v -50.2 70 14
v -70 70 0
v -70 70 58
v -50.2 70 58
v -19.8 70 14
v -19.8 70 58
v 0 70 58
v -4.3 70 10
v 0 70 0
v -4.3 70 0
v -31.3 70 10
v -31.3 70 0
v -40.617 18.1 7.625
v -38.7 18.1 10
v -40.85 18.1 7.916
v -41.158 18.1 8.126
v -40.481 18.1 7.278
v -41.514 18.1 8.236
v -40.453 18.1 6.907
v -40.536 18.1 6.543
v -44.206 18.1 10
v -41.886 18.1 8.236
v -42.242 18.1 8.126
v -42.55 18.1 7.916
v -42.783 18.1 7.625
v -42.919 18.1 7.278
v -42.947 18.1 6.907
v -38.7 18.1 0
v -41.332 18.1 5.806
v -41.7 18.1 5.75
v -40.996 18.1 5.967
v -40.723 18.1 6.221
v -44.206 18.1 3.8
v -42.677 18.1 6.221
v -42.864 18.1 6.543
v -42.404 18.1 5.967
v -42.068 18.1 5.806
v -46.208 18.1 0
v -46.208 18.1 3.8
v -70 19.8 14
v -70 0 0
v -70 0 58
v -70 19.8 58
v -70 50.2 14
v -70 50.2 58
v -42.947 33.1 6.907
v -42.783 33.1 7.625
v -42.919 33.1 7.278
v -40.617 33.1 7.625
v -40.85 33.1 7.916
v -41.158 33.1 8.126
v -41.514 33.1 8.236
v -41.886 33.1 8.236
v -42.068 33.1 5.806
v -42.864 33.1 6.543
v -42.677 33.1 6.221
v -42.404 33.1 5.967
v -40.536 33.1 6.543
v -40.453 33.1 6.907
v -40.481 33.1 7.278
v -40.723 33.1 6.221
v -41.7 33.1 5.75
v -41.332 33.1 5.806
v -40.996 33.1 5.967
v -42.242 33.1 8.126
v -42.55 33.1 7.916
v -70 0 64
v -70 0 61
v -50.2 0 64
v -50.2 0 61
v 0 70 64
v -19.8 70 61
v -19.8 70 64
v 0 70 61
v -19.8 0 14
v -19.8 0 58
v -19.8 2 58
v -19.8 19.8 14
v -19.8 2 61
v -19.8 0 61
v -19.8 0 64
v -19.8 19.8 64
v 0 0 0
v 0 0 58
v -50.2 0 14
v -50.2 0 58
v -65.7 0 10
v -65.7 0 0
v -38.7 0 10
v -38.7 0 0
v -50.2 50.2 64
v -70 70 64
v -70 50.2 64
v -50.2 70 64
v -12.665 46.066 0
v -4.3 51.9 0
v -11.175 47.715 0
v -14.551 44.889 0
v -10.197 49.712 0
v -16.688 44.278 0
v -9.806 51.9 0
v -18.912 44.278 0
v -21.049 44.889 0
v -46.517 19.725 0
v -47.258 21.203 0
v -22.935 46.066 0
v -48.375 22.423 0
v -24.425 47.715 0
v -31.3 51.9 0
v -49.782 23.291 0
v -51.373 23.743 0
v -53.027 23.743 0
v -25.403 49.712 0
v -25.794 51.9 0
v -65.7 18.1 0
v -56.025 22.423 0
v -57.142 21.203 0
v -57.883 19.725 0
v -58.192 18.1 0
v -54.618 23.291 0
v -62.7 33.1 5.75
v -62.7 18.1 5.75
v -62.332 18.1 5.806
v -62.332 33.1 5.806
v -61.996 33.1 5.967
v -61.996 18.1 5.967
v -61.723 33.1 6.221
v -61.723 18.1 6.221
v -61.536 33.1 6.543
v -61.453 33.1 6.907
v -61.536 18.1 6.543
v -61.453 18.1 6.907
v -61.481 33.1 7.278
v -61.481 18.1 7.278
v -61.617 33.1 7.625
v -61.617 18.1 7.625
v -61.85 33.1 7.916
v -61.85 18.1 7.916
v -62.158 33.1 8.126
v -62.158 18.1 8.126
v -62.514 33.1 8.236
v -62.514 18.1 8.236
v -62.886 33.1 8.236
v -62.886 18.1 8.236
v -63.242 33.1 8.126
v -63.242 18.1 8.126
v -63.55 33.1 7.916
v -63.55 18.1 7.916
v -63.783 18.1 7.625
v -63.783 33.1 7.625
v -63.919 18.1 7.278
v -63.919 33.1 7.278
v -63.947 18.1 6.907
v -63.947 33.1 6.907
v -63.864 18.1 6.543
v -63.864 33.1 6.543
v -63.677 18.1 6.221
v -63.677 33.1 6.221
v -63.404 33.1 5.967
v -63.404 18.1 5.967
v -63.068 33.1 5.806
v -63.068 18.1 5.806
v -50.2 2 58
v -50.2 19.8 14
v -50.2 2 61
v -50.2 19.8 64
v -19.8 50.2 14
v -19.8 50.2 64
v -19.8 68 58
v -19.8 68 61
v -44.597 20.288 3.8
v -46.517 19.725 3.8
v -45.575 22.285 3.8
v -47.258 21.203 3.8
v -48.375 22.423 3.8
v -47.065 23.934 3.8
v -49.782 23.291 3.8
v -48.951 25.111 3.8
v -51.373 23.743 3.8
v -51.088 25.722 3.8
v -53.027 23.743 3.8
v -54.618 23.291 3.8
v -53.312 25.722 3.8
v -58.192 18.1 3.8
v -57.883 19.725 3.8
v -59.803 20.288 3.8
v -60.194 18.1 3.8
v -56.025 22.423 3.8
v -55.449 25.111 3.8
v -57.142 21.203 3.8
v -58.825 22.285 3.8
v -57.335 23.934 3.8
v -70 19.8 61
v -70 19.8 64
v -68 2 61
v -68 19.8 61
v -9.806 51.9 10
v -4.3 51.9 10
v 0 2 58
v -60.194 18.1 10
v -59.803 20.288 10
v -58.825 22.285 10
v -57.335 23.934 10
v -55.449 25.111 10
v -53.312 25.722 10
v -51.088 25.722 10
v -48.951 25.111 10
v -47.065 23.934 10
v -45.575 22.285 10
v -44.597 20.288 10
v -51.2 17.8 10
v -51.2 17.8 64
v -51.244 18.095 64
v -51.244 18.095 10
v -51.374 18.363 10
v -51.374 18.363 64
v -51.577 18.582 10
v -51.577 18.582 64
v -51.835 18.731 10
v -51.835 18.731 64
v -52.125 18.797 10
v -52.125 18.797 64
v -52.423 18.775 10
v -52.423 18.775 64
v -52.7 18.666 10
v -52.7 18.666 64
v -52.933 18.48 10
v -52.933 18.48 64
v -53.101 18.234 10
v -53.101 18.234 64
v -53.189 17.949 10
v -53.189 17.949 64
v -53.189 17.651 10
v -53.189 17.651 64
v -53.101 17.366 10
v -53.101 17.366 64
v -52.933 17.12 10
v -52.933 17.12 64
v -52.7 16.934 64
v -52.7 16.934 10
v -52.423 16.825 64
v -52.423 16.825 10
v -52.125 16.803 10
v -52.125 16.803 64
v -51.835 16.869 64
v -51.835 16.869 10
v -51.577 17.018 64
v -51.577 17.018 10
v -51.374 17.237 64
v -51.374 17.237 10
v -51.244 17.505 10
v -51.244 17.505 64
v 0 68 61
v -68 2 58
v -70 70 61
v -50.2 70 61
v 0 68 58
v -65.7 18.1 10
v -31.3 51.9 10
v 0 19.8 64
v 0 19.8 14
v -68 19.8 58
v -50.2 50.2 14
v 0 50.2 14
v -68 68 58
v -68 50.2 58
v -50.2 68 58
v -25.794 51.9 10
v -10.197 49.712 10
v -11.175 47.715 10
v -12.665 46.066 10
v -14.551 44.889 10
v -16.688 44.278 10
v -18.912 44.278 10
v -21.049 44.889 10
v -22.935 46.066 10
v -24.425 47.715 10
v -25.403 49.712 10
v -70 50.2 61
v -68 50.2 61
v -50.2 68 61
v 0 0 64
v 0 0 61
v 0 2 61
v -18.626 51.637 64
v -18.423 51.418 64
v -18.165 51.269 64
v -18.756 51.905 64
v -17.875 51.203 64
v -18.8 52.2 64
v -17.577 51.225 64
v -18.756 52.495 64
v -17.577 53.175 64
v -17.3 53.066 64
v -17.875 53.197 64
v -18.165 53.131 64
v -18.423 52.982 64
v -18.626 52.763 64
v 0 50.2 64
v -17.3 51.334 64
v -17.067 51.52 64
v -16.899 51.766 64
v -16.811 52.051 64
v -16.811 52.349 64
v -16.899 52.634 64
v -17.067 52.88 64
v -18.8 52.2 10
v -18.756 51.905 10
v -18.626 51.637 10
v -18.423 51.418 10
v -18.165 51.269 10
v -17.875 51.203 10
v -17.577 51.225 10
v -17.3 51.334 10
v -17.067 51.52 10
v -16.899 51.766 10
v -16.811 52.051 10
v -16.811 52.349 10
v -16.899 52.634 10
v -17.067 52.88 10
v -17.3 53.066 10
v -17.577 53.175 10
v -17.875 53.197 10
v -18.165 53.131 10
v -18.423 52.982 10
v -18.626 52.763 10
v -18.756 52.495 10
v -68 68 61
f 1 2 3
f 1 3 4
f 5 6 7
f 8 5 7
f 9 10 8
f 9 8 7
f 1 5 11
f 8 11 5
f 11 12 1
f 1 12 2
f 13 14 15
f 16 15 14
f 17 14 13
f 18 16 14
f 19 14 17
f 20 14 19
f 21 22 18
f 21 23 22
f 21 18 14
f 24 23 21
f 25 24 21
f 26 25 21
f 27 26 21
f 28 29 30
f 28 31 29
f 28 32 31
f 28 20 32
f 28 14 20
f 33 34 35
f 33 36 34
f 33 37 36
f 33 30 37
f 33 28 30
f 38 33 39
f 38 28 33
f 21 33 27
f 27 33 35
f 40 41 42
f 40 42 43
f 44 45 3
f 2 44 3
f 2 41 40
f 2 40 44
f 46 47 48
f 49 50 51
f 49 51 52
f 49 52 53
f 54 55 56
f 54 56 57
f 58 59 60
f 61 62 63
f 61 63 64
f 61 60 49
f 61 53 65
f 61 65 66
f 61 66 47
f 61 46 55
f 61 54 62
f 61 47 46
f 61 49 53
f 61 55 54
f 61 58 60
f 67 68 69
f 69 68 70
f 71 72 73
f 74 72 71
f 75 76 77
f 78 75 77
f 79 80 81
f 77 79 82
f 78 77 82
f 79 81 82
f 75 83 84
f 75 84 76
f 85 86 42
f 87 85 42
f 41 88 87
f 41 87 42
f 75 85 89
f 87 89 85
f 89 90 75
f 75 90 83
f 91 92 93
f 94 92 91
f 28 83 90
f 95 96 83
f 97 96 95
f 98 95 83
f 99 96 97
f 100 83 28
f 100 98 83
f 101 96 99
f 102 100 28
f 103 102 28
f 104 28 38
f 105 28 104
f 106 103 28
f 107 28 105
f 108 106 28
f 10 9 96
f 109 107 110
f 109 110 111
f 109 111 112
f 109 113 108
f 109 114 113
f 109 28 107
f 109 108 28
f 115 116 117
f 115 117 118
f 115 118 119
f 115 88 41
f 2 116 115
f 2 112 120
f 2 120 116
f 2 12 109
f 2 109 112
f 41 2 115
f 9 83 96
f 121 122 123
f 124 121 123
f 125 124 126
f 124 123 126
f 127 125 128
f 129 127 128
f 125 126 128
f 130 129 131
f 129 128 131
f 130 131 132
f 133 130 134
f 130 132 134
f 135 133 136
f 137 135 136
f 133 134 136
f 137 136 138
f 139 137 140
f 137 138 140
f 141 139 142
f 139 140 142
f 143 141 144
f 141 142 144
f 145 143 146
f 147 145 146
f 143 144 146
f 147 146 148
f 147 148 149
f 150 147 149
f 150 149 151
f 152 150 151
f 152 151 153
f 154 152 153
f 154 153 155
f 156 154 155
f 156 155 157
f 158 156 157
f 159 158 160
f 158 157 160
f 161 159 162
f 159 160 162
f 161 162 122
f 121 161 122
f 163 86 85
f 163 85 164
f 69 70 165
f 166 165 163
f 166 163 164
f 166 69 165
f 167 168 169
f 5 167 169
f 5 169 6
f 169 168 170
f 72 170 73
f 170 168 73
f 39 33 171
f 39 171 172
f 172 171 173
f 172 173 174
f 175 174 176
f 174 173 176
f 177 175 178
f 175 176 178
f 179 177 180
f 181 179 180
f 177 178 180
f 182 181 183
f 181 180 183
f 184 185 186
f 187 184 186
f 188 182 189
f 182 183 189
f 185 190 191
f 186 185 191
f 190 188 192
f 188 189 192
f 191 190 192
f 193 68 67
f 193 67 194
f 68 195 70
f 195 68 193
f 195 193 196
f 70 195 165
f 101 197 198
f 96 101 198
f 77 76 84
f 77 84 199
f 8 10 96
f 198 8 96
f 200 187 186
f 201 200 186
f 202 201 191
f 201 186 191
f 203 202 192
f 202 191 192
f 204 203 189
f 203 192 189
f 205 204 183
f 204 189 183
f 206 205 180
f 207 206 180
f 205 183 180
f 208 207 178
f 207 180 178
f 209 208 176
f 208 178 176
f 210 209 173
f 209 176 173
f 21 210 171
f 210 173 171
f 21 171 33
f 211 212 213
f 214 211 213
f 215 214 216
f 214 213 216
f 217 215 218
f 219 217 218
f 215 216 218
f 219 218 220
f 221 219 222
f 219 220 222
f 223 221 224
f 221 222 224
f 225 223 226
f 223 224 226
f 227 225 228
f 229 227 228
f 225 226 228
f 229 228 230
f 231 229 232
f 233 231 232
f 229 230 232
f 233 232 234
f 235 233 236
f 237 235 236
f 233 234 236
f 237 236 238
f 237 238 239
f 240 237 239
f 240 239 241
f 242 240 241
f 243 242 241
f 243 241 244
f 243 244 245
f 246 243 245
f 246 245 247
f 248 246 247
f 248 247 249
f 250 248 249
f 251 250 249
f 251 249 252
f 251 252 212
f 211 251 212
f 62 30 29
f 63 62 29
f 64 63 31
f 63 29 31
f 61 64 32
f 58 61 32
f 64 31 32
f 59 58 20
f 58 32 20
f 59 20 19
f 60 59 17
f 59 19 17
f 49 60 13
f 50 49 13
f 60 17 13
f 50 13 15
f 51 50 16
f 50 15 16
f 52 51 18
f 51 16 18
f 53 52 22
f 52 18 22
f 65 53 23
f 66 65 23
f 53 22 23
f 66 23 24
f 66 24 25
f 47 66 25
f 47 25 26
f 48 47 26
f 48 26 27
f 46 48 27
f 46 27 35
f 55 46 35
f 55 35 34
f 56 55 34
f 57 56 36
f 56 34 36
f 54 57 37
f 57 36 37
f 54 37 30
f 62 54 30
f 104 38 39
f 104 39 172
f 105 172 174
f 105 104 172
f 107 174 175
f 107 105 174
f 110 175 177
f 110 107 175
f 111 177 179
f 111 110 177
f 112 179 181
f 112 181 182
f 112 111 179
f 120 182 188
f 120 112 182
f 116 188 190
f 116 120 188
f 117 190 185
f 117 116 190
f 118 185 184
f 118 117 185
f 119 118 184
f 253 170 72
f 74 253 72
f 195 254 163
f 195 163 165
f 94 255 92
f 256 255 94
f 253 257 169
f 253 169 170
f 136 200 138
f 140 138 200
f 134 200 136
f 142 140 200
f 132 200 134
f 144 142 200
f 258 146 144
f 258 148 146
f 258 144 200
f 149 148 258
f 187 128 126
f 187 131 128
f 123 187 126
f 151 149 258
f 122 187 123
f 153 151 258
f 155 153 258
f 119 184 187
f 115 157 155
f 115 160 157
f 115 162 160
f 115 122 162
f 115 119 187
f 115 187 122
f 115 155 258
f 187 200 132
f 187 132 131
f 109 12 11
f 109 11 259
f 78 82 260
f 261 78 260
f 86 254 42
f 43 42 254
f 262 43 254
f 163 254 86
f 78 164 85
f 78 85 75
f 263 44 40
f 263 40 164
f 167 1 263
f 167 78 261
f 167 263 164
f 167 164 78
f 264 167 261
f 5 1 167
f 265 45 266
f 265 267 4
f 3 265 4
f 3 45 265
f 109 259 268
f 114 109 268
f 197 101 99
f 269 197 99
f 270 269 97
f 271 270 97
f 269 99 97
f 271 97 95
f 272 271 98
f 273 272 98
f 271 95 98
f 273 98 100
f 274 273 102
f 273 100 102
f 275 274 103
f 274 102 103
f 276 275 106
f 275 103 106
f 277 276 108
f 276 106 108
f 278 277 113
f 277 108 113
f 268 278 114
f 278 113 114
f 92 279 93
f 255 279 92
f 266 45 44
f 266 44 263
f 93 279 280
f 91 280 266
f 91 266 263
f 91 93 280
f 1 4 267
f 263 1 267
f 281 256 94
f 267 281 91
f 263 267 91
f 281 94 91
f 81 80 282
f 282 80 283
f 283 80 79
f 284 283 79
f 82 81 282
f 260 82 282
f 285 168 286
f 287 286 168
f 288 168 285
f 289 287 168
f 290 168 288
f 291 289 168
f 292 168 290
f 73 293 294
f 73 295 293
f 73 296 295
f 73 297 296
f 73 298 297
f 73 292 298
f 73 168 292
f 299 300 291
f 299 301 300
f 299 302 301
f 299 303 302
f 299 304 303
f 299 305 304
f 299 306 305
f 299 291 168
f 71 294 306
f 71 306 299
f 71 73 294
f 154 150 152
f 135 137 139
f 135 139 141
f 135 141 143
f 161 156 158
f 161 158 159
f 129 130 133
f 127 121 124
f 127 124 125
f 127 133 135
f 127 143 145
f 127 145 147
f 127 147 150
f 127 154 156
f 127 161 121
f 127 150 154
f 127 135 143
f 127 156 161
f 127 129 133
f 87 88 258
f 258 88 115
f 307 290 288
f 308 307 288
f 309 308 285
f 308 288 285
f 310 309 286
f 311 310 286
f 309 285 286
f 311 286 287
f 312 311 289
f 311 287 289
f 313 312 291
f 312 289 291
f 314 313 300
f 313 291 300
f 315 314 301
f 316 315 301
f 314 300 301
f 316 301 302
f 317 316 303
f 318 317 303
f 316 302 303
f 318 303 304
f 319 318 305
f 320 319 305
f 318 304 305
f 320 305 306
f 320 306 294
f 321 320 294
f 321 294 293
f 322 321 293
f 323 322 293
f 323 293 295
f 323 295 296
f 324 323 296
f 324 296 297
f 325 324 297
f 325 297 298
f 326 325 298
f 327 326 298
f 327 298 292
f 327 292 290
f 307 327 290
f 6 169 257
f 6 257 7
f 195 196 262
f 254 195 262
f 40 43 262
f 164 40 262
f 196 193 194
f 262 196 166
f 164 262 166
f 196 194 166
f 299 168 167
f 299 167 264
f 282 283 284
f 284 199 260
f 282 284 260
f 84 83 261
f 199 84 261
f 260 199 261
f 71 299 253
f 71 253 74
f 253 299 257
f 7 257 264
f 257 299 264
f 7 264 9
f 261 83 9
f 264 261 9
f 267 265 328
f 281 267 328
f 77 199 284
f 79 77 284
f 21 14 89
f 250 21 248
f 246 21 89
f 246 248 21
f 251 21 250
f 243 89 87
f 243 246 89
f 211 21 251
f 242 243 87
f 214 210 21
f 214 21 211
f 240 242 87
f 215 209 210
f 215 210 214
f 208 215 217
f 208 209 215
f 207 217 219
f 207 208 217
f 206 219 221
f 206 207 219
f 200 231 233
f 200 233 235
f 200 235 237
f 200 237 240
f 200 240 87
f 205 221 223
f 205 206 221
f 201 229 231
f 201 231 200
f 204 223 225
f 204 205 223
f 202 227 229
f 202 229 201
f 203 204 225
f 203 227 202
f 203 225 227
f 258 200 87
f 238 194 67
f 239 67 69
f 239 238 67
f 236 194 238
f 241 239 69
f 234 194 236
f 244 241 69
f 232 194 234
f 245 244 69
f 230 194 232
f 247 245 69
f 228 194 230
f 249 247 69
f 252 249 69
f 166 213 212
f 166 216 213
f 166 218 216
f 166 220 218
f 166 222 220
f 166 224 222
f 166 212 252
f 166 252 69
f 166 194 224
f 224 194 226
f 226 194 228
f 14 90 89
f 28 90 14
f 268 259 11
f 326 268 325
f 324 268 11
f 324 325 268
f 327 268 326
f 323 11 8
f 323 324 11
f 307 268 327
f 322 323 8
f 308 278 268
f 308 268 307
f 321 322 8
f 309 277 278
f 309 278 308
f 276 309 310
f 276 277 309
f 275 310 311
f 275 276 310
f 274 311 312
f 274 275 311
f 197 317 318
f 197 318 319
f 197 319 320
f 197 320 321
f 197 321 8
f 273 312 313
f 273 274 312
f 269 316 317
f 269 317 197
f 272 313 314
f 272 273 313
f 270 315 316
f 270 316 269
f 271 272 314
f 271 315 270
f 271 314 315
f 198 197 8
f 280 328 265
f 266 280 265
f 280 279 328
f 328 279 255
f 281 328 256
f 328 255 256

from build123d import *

# Parameters (mm, degrees)
ESQUISSE1_W                  = 70
ESQUISSE1_H                  = 70
BOSS_EXTRU_1_DEPTH           = 64
ESQUISSE2_W                  = 30.4
ESQUISSE2_H                  = 19.8
ESQUISSE2_H_2                = 30.4
ESQUISSE2_W_2                = 19.8
ENL_V_MAT_EXTRU_1_DEPTH      = 50
ESQUISSE5_W                  = 3
ESQUISSE5_H                  = 2
ENL_V_MAT_EXTRU_3_DEPTH      = 71
ESQUISSE6_W                  = 2
ESQUISSE6_H                  = 3
ENL_V_MAT_EXTRU_4_DEPTH      = 71
ESQUISSE7_R                  = 1
ENL_V_MAT_EXTRU_5_DEPTH      = 65
ENL_V_MAT_EXTRU_7_DEPTH      = 10
BOSS_EXTRU_2_DEPTH           = 3.8
ESQUISSE10_W                 = 27
ESQUISSE10_H                 = 18.1
ENL_V_MAT_EXTRU_8_DEPTH      = 10
ESQUISSE11_R                 = 1.25
ENL_V_MAT_EXTRU_9_DEPTH      = 15
R_P_TITION_CIRCULAIRE1_COUNT = 2


with BuildPart() as part:
    # Esquisse1 → Boss.-Extru.1 (new body)
    with BuildSketch(Plane.XY):
        with Locations((-35, 35)):
            Rectangle(ESQUISSE1_W, ESQUISSE1_H)
    extrude(amount=BOSS_EXTRU_1_DEPTH)

    # Esquisse2 → Enlèv. mat.-Extru.1 (cut)
    with BuildSketch(Plane.XY.offset(64)):
        with Locations((-35, 60.1)):
            Rectangle(ESQUISSE2_W, ESQUISSE2_H)
        with Locations((-35, 35)):
            Rectangle(ESQUISSE2_W, ESQUISSE2_H_2)
        with Locations((-9.9, 35)):
            Rectangle(ESQUISSE2_W_2, ESQUISSE2_H_2)
        with Locations((-60.1, 35)):
            Rectangle(ESQUISSE2_W_2, ESQUISSE2_H_2)
        with Locations((-35, 9.9)):
            Rectangle(ESQUISSE2_W, ESQUISSE2_H)
    extrude(amount=-ENL_V_MAT_EXTRU_1_DEPTH, mode=Mode.SUBTRACT)

    # Esquisse5 → Enlèv. mat.-Extru.3 (cut, through all)
    with BuildSketch(Plane.ZY.offset(70)):
        with Locations((59.5, 69)):
            Rectangle(ESQUISSE5_W, ESQUISSE5_H)
        with Locations((59.5, 1)):
            Rectangle(ESQUISSE5_W, ESQUISSE5_H)
    extrude(amount=-ENL_V_MAT_EXTRU_3_DEPTH, mode=Mode.SUBTRACT)

    # Esquisse6 → Enlèv. mat.-Extru.4 (cut, through all)
    with BuildSketch(Plane(origin=(0, 70, 0), x_dir=(1, 0, 0), z_dir=(0, 1, 0))):
        with Locations((-69, -59.5)):
            Rectangle(ESQUISSE6_W, ESQUISSE6_H)
    extrude(amount=-ENL_V_MAT_EXTRU_4_DEPTH, mode=Mode.SUBTRACT)

    # Esquisse7 → Enlèv. mat.-Extru.5 (cut, through all)
    with BuildSketch(Plane.XY.offset(64)):
        with Locations((-52.2, 17.8)):
            Circle(ESQUISSE7_R)
    enl_v_mat_extru_5 = extrude(amount=-ENL_V_MAT_EXTRU_5_DEPTH, mode=Mode.SUBTRACT)

    # Esquisse8 → Enlèv. mat.-Extru.7 (cut)
    with BuildSketch(Plane(origin=(0, 0, 0), x_dir=(-1, 0, 0), z_dir=(0, 0, -1))):
        with BuildLine():
            Line((60.2, 0), (60.2, 17.8))
            ThreePointArc((60.2, 17.8), (52.2, 9.8), (44.2, 17.8))
            Line((44.2, 17.8), (44.2, 0))
            Line((44.2, 0), (60.2, 0))
        make_face()
        with BuildLine():
            ThreePointArc((44.2, 17.8), (52.2, 9.8), (60.2, 17.8))
            Line((60.2, 17.8), (53.2, 17.8))
            ThreePointArc((53.2, 17.8), (52.2, 16.8), (51.2, 17.8))
            Line((51.2, 17.8), (44.2, 17.8))
        make_face()
        with BuildLine():
            Line((53.2, 17.8), (60.2, 17.8))
            ThreePointArc((60.2, 17.8), (52.2, 25.8), (44.2, 17.8))
            Line((44.2, 17.8), (51.2, 17.8))
            ThreePointArc((51.2, 17.8), (52.2, 18.8), (53.2, 17.8))
        make_face()
    enl_v_mat_extru_7 = extrude(amount=-ENL_V_MAT_EXTRU_7_DEPTH, mode=Mode.SUBTRACT)

    # Esquisse9 → Boss.-Extru.2 (add)
    with BuildSketch(Plane(origin=(0, 0, 0), x_dir=(-1, 0, 0), z_dir=(0, 0, -1))):
        with BuildLine():
            Line((46.2, 0), (46.2, 17.8))
            ThreePointArc((46.2, 17.8), (52.2, 23.8), (58.2, 17.8))
            Line((58.2, 17.8), (58.2, 0))
            Line((58.2, 0), (60.2, 0))
            Line((60.2, 0), (60.2, 17.8))
            Line((60.2, 17.8), (60.175717696, 28.742363645))
            Line((60.175717696, 28.742363645), (44.2, 28.742363645))
            Line((44.2, 28.742363645), (44.2, 0))
            Line((44.2, 0), (46.2, 0))
        make_face()
    extrude(amount=-BOSS_EXTRU_2_DEPTH)

    # Esquisse10 → Enlèv. mat.-Extru.8 (cut)
    with BuildSketch(Plane(origin=(0, 0, 0), x_dir=(-1, 0, 0), z_dir=(0, 0, -1))):
        with Locations((52.2, 9.05)):
            Rectangle(ESQUISSE10_W, ESQUISSE10_H)
    enl_v_mat_extru_8 = extrude(amount=-ENL_V_MAT_EXTRU_8_DEPTH, mode=Mode.SUBTRACT)

    # Esquisse11 → Enlèv. mat.-Extru.9 (cut)
    with BuildSketch(Plane.XZ.offset(-18.1)):
        with Locations(Location((-41.7, 7, 0), (0, 0, 270))):  # turned: the seam where the file's is
            Circle(ESQUISSE11_R)
        with Locations(Location((-62.7, 7, 0), (0, 0, 270))):  # turned: the seam where the file's is
            Circle(ESQUISSE11_R)
    extrude(amount=-ENL_V_MAT_EXTRU_9_DEPTH, mode=Mode.SUBTRACT)

    # Répétition circulaire1: Enlèv. mat.-Extru.5, Enlèv. mat.-Extru.7, Enlèv. mat.-Extru.8 ×2 about axis
    r_p_tition_circulaire1_axis = Axis((-35, 35, 0), (0, 0, 1))
    add([enl_v_mat_extru_5.rotate(r_p_tition_circulaire1_axis, i * 360 / R_P_TITION_CIRCULAIRE1_COUNT) for i in range(1, R_P_TITION_CIRCULAIRE1_COUNT)], mode=Mode.SUBTRACT)
    add([enl_v_mat_extru_7.rotate(r_p_tition_circulaire1_axis, i * 360 / R_P_TITION_CIRCULAIRE1_COUNT) for i in range(1, R_P_TITION_CIRCULAIRE1_COUNT)], mode=Mode.SUBTRACT)
    add([enl_v_mat_extru_8.rotate(r_p_tition_circulaire1_axis, i * 360 / R_P_TITION_CIRCULAIRE1_COUNT) for i in range(1, R_P_TITION_CIRCULAIRE1_COUNT)], mode=Mode.SUBTRACT)


solid = part.part
